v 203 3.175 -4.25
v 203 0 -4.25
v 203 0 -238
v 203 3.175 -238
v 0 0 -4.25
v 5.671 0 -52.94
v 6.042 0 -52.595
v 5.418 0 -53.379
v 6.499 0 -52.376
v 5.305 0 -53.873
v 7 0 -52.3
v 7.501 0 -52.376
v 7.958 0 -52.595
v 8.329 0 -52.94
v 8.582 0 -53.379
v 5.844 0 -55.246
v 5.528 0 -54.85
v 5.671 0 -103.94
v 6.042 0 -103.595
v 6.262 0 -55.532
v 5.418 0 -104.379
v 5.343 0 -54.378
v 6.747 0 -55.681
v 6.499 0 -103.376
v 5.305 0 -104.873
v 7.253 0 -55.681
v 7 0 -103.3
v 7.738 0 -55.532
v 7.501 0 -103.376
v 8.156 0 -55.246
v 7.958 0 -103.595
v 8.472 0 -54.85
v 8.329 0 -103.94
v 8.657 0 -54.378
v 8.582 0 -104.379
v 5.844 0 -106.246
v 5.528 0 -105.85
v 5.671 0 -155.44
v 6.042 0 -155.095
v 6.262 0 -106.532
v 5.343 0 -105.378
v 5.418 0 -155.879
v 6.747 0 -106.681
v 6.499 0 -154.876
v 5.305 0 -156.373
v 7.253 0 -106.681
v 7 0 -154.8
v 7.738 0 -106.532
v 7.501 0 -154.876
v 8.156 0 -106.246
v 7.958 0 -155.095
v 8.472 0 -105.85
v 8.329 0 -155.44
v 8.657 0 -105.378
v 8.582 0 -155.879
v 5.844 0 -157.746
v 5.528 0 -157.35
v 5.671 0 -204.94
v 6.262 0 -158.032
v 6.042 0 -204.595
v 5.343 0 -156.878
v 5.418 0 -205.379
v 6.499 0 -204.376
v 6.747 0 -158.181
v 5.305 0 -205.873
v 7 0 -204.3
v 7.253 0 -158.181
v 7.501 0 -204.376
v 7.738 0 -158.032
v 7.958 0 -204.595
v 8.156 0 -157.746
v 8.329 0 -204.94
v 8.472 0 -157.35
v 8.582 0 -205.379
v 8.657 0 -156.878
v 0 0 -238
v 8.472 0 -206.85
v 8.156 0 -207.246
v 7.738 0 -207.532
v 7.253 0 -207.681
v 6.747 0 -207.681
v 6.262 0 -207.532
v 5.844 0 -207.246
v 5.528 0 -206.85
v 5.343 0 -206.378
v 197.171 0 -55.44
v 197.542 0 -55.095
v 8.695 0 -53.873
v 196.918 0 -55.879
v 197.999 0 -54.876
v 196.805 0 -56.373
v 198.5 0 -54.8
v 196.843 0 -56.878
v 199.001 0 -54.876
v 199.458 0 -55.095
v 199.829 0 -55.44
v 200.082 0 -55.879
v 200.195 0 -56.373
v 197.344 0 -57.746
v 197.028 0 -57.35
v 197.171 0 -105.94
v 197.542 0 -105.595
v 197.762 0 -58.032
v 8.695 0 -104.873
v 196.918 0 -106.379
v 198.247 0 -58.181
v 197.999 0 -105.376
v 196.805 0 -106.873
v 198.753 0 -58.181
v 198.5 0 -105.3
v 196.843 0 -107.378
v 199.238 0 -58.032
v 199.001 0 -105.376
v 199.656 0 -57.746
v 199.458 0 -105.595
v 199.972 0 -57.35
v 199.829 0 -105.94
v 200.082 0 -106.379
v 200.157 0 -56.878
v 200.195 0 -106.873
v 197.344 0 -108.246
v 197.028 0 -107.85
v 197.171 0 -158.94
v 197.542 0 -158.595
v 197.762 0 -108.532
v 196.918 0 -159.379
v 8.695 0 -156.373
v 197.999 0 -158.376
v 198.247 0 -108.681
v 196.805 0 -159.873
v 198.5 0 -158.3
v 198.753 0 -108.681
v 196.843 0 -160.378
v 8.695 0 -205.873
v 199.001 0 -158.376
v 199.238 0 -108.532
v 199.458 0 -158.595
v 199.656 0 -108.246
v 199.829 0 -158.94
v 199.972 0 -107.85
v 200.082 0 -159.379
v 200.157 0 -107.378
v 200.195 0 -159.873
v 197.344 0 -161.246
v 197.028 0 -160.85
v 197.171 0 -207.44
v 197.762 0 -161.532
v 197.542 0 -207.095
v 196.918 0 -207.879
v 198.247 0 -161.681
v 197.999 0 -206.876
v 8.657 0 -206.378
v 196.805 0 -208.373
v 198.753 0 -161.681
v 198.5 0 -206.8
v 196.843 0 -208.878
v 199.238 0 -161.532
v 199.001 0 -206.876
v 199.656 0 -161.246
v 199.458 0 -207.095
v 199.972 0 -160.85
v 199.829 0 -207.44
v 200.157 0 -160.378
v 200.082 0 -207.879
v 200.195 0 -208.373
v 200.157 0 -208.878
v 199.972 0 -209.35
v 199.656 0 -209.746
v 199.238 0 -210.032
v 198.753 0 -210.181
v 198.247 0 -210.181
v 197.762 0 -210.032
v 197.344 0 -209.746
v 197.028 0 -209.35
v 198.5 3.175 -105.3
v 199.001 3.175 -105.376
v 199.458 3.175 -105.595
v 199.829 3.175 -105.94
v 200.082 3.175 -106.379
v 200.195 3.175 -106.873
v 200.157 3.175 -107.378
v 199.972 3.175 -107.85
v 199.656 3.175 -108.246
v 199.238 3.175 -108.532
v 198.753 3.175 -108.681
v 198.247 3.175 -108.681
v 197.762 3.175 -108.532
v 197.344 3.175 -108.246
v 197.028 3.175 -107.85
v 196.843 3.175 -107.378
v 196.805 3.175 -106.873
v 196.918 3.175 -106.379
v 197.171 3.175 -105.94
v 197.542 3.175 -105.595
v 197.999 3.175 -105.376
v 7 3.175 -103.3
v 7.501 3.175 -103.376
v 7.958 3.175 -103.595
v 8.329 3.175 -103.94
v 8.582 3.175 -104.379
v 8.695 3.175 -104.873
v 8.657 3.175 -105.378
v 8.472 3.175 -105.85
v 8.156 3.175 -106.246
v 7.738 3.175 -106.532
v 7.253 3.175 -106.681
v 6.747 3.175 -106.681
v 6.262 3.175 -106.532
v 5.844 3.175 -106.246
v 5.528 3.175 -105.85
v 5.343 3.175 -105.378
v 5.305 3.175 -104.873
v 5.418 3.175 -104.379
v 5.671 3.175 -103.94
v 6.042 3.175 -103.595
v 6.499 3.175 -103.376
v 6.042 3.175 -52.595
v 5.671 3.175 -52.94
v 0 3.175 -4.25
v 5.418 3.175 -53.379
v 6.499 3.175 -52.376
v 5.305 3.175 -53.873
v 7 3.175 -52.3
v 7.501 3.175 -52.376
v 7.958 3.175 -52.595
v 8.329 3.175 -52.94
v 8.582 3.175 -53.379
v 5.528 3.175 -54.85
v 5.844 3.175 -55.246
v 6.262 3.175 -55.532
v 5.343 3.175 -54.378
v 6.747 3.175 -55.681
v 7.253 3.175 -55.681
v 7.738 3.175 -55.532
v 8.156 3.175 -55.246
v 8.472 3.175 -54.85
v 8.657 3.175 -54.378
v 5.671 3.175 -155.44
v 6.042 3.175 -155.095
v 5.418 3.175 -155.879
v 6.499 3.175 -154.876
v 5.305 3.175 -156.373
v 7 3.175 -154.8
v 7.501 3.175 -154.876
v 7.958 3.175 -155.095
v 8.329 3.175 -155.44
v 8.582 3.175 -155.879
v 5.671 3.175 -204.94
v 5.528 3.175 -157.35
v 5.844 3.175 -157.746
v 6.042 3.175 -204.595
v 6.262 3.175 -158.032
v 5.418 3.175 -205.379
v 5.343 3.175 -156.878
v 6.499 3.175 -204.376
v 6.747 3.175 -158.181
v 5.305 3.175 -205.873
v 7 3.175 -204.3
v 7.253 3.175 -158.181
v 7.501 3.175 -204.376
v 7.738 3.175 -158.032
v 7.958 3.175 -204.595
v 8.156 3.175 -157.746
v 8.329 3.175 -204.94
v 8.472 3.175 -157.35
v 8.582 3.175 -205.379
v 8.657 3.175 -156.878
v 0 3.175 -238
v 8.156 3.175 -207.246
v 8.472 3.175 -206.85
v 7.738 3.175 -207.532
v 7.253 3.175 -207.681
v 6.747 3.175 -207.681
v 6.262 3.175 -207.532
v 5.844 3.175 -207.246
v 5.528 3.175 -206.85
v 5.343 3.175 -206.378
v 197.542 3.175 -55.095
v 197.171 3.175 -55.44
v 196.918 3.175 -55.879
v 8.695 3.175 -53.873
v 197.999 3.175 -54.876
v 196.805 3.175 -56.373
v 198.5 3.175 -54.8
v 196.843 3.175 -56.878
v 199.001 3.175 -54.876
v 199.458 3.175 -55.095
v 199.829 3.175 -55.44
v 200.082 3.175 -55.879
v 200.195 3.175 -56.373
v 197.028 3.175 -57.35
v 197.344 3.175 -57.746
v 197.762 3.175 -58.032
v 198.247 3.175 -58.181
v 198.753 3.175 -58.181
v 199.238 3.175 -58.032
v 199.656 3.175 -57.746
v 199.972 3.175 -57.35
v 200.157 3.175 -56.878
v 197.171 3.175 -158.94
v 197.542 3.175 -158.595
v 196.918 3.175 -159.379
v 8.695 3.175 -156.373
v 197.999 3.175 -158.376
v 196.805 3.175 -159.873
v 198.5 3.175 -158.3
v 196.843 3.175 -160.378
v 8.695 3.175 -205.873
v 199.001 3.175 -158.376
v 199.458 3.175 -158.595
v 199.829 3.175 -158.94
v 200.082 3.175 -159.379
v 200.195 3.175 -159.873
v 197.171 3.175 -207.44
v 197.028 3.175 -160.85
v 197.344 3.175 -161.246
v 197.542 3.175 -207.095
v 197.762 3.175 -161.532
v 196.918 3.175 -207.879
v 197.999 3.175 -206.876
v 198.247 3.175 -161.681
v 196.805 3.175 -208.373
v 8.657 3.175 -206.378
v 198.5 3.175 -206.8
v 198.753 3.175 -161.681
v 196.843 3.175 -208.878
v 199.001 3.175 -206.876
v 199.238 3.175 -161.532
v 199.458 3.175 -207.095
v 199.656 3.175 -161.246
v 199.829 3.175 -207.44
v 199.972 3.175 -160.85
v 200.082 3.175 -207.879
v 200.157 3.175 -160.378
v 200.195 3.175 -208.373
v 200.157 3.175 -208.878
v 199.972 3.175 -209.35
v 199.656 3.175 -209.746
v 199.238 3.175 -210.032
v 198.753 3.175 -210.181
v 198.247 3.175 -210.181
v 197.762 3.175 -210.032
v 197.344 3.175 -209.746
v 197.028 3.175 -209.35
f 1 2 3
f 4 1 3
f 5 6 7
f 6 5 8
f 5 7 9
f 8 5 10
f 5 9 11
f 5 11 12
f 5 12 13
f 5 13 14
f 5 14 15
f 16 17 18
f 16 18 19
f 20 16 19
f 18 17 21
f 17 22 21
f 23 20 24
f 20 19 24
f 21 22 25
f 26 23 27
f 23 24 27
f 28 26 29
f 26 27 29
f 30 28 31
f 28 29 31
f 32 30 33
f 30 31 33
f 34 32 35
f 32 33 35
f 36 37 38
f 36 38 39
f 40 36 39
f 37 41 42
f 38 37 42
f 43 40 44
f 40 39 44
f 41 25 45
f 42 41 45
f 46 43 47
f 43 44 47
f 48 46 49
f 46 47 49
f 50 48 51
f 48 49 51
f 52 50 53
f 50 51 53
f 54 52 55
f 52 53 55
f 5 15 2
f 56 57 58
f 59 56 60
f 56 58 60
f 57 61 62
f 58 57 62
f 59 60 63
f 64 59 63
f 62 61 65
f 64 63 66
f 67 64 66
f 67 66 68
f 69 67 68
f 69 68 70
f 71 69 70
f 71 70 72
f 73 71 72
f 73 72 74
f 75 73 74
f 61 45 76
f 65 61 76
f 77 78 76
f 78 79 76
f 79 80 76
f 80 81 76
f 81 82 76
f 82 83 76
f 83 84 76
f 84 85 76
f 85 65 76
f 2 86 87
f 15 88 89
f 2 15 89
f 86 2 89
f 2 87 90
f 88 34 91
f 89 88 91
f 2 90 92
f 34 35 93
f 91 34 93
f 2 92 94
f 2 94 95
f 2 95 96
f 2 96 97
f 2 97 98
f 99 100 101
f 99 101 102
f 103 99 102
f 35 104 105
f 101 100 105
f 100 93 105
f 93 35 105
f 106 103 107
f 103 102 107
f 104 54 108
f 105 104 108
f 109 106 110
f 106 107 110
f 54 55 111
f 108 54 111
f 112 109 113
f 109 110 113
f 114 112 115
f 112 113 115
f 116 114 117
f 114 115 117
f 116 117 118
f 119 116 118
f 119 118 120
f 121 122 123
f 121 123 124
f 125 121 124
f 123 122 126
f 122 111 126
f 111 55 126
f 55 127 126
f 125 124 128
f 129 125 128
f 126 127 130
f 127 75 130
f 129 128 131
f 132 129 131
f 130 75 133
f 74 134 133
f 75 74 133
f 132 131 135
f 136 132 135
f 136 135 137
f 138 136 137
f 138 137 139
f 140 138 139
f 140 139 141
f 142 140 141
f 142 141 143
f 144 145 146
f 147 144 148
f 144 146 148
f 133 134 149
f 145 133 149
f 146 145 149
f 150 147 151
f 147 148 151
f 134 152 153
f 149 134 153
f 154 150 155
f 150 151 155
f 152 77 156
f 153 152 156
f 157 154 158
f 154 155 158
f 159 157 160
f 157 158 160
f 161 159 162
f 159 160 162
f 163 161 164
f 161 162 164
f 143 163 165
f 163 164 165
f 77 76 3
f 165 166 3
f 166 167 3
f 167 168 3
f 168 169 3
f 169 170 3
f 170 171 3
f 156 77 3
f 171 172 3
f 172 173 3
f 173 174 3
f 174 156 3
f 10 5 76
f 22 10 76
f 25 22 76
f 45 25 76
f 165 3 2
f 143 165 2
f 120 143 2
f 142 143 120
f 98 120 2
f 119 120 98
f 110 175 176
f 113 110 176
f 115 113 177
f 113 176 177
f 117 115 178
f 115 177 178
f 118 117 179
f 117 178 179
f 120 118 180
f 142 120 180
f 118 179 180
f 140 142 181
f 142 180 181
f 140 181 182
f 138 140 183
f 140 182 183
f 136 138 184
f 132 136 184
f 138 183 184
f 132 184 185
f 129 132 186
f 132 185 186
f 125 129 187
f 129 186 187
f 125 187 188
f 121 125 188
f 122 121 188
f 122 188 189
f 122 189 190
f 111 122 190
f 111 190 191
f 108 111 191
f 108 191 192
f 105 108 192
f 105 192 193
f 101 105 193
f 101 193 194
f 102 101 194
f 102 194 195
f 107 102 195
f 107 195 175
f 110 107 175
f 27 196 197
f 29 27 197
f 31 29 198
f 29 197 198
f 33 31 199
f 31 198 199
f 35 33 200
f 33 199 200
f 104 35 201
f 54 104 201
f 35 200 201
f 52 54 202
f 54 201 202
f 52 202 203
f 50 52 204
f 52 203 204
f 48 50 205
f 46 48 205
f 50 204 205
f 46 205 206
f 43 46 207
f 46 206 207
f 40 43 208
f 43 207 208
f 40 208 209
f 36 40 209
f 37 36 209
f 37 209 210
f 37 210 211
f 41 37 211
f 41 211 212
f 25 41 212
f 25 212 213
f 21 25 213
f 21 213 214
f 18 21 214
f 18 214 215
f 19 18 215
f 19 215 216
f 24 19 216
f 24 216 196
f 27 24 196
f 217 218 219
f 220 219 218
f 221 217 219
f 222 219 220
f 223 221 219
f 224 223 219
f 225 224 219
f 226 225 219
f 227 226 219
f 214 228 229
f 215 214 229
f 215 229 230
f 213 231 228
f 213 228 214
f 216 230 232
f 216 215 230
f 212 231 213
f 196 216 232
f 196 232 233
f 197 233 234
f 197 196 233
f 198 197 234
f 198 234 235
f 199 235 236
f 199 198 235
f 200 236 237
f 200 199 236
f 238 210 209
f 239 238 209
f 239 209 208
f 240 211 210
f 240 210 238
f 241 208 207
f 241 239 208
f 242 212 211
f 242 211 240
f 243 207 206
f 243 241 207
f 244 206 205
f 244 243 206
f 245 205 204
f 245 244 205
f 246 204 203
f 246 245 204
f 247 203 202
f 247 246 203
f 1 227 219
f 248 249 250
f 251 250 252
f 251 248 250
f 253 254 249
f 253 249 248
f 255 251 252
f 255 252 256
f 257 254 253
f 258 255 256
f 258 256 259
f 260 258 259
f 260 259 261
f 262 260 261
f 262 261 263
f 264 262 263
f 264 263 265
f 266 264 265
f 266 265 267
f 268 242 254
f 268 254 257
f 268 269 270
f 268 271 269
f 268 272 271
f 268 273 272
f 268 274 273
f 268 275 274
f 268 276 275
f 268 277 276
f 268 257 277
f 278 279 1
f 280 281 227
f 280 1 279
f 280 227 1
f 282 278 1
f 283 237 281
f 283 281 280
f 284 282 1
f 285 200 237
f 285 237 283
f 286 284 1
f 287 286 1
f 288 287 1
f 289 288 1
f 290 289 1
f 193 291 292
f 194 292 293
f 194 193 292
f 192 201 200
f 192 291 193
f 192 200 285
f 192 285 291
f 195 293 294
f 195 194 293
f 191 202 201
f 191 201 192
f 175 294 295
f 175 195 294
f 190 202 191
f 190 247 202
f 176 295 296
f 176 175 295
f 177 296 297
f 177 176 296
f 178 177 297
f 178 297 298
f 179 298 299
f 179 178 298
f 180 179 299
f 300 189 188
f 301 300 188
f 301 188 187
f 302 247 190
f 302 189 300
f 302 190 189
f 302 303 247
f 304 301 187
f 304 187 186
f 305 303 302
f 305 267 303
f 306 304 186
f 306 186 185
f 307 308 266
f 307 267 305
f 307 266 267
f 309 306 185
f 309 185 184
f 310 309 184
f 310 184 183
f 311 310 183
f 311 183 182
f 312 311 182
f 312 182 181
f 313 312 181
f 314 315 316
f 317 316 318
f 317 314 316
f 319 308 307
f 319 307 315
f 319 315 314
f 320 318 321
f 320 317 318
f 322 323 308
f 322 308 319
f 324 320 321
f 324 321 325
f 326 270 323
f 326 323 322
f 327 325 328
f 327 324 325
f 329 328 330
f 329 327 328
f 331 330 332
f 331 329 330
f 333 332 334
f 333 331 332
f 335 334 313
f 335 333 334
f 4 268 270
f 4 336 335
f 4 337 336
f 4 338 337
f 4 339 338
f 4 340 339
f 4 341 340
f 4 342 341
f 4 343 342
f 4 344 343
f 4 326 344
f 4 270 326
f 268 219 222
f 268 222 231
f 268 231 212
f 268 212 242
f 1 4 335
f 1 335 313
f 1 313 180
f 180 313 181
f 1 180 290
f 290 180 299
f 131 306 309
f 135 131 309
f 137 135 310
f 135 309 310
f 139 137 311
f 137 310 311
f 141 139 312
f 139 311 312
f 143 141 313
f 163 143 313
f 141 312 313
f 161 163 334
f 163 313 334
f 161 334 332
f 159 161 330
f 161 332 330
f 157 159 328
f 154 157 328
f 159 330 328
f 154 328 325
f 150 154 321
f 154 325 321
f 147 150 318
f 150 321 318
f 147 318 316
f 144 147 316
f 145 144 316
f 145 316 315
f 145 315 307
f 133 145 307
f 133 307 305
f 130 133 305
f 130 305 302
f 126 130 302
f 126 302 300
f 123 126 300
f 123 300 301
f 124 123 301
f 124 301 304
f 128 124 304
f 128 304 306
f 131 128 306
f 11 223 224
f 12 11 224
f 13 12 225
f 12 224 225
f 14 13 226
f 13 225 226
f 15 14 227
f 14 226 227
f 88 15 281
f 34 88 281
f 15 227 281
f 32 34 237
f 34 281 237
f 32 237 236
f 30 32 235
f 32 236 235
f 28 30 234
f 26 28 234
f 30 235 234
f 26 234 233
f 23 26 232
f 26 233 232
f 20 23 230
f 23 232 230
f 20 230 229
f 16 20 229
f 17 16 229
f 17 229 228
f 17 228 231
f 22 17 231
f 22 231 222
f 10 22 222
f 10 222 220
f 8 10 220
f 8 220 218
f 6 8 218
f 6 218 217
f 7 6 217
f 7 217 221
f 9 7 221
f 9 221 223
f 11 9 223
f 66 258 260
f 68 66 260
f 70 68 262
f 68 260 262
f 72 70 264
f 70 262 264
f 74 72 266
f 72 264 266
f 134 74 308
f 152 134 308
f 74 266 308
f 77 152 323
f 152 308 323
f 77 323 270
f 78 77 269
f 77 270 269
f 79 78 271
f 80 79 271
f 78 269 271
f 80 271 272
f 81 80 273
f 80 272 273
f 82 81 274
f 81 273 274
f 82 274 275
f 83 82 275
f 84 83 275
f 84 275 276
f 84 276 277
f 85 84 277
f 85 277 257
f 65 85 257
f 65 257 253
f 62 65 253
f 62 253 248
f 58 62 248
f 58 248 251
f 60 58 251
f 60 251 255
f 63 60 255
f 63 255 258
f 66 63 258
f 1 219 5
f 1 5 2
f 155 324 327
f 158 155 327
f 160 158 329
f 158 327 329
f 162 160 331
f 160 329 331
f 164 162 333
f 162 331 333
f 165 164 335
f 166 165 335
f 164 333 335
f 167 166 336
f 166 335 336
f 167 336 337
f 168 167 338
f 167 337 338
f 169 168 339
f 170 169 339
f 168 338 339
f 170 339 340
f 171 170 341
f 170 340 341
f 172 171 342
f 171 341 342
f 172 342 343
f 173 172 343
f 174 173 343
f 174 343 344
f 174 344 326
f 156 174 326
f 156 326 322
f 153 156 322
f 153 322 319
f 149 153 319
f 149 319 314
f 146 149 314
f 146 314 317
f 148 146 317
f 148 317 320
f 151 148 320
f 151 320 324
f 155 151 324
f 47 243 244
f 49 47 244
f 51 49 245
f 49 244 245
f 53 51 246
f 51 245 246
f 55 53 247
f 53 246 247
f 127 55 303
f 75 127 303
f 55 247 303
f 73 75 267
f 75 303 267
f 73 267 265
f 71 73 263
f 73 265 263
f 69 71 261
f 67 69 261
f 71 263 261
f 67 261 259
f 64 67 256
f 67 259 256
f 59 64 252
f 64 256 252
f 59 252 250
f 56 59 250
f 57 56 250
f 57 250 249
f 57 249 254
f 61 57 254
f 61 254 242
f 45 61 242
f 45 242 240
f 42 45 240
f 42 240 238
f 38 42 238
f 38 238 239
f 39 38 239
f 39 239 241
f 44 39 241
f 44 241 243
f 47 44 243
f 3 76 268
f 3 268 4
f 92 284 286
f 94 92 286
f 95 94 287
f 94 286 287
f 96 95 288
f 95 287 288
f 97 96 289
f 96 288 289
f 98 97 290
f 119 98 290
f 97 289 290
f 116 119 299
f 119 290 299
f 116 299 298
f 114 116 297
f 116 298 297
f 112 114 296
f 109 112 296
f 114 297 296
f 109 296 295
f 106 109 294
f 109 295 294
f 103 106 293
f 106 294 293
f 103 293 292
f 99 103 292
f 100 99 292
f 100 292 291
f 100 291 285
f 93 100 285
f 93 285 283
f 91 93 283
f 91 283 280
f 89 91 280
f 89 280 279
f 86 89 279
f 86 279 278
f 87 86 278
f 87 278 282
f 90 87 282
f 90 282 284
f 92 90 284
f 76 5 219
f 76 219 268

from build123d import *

# Parameters (mm, degrees)
SKETCH1_W           = 203
SKETCH1_H           = 238
BOSS_EXTRUDE1_DEPTH = 3.175
SKETCH2_R           = 1.7
CUT_EXTRUDE1_DEPTH  = 313.830753963
SKETCH3_R           = 1.7
CUT_EXTRUDE2_DEPTH  = 313.830753963
SKETCH4_W           = 203
SKETCH4_H           = 4.25
CUT_EXTRUDE3_DEPTH  = 313.830753963


with BuildPart() as part:
    # Sketch1 → Boss-Extrude1 (new body)
    with BuildSketch(Plane(origin=(0, 0, 0), x_dir=(1, 0, 0), z_dir=(0, 1, 0))):
        with Locations((101.5, 119)):
            Rectangle(SKETCH1_W, SKETCH1_H)
    extrude(amount=BOSS_EXTRUDE1_DEPTH)

    # Sketch2 → Cut-Extrude1 (cut, through all)
    with BuildSketch(Plane(origin=(0, 3.175, 0), x_dir=(1, 0, 0), z_dir=(0, 1, 0))):
        with Locations(Location((7, 206, 0), (0, 0, 270))):
            Circle(SKETCH2_R)
        with Locations(Location((7, 156.5, 0), (0, 0, 270))):
            Circle(SKETCH2_R)
        with Locations(Location((7, 105, 0), (0, 0, 270))):
            Circle(SKETCH2_R)
        with Locations(Location((7, 54, 0), (0, 0, 270))):
            Circle(SKETCH2_R)
    extrude(amount=-CUT_EXTRUDE1_DEPTH, mode=Mode.SUBTRACT)

    # Sketch3 → Cut-Extrude2 (cut, through all)
    with BuildSketch(Plane(origin=(0, 3.175, 0), x_dir=(1, 0, 0), z_dir=(0, 1, 0))):
        with Locations(Location((198.5, 208.5, 0), (0, 0, 270))):
            Circle(SKETCH3_R)
        with Locations(Location((198.5, 160, 0), (0, 0, 270))):
            Circle(SKETCH3_R)
        with Locations(Location((198.5, 107, 0), (0, 0, 270))):
            Circle(SKETCH3_R)
        with Locations(Location((198.5, 56.5, 0), (0, 0, 270))):
            Circle(SKETCH3_R)
    extrude(amount=-CUT_EXTRUDE2_DEPTH, mode=Mode.SUBTRACT)

    # Sketch4 → Cut-Extrude3 (cut, through all)
    with BuildSketch(Plane(origin=(0, 3.175, 0), x_dir=(1, 0, 0), z_dir=(0, 1, 0))):
        with Locations((101.5, 2.125)):
            Rectangle(SKETCH4_W, SKETCH4_H)
    extrude(amount=-CUT_EXTRUDE3_DEPTH, mode=Mode.SUBTRACT)


solid = part.part
